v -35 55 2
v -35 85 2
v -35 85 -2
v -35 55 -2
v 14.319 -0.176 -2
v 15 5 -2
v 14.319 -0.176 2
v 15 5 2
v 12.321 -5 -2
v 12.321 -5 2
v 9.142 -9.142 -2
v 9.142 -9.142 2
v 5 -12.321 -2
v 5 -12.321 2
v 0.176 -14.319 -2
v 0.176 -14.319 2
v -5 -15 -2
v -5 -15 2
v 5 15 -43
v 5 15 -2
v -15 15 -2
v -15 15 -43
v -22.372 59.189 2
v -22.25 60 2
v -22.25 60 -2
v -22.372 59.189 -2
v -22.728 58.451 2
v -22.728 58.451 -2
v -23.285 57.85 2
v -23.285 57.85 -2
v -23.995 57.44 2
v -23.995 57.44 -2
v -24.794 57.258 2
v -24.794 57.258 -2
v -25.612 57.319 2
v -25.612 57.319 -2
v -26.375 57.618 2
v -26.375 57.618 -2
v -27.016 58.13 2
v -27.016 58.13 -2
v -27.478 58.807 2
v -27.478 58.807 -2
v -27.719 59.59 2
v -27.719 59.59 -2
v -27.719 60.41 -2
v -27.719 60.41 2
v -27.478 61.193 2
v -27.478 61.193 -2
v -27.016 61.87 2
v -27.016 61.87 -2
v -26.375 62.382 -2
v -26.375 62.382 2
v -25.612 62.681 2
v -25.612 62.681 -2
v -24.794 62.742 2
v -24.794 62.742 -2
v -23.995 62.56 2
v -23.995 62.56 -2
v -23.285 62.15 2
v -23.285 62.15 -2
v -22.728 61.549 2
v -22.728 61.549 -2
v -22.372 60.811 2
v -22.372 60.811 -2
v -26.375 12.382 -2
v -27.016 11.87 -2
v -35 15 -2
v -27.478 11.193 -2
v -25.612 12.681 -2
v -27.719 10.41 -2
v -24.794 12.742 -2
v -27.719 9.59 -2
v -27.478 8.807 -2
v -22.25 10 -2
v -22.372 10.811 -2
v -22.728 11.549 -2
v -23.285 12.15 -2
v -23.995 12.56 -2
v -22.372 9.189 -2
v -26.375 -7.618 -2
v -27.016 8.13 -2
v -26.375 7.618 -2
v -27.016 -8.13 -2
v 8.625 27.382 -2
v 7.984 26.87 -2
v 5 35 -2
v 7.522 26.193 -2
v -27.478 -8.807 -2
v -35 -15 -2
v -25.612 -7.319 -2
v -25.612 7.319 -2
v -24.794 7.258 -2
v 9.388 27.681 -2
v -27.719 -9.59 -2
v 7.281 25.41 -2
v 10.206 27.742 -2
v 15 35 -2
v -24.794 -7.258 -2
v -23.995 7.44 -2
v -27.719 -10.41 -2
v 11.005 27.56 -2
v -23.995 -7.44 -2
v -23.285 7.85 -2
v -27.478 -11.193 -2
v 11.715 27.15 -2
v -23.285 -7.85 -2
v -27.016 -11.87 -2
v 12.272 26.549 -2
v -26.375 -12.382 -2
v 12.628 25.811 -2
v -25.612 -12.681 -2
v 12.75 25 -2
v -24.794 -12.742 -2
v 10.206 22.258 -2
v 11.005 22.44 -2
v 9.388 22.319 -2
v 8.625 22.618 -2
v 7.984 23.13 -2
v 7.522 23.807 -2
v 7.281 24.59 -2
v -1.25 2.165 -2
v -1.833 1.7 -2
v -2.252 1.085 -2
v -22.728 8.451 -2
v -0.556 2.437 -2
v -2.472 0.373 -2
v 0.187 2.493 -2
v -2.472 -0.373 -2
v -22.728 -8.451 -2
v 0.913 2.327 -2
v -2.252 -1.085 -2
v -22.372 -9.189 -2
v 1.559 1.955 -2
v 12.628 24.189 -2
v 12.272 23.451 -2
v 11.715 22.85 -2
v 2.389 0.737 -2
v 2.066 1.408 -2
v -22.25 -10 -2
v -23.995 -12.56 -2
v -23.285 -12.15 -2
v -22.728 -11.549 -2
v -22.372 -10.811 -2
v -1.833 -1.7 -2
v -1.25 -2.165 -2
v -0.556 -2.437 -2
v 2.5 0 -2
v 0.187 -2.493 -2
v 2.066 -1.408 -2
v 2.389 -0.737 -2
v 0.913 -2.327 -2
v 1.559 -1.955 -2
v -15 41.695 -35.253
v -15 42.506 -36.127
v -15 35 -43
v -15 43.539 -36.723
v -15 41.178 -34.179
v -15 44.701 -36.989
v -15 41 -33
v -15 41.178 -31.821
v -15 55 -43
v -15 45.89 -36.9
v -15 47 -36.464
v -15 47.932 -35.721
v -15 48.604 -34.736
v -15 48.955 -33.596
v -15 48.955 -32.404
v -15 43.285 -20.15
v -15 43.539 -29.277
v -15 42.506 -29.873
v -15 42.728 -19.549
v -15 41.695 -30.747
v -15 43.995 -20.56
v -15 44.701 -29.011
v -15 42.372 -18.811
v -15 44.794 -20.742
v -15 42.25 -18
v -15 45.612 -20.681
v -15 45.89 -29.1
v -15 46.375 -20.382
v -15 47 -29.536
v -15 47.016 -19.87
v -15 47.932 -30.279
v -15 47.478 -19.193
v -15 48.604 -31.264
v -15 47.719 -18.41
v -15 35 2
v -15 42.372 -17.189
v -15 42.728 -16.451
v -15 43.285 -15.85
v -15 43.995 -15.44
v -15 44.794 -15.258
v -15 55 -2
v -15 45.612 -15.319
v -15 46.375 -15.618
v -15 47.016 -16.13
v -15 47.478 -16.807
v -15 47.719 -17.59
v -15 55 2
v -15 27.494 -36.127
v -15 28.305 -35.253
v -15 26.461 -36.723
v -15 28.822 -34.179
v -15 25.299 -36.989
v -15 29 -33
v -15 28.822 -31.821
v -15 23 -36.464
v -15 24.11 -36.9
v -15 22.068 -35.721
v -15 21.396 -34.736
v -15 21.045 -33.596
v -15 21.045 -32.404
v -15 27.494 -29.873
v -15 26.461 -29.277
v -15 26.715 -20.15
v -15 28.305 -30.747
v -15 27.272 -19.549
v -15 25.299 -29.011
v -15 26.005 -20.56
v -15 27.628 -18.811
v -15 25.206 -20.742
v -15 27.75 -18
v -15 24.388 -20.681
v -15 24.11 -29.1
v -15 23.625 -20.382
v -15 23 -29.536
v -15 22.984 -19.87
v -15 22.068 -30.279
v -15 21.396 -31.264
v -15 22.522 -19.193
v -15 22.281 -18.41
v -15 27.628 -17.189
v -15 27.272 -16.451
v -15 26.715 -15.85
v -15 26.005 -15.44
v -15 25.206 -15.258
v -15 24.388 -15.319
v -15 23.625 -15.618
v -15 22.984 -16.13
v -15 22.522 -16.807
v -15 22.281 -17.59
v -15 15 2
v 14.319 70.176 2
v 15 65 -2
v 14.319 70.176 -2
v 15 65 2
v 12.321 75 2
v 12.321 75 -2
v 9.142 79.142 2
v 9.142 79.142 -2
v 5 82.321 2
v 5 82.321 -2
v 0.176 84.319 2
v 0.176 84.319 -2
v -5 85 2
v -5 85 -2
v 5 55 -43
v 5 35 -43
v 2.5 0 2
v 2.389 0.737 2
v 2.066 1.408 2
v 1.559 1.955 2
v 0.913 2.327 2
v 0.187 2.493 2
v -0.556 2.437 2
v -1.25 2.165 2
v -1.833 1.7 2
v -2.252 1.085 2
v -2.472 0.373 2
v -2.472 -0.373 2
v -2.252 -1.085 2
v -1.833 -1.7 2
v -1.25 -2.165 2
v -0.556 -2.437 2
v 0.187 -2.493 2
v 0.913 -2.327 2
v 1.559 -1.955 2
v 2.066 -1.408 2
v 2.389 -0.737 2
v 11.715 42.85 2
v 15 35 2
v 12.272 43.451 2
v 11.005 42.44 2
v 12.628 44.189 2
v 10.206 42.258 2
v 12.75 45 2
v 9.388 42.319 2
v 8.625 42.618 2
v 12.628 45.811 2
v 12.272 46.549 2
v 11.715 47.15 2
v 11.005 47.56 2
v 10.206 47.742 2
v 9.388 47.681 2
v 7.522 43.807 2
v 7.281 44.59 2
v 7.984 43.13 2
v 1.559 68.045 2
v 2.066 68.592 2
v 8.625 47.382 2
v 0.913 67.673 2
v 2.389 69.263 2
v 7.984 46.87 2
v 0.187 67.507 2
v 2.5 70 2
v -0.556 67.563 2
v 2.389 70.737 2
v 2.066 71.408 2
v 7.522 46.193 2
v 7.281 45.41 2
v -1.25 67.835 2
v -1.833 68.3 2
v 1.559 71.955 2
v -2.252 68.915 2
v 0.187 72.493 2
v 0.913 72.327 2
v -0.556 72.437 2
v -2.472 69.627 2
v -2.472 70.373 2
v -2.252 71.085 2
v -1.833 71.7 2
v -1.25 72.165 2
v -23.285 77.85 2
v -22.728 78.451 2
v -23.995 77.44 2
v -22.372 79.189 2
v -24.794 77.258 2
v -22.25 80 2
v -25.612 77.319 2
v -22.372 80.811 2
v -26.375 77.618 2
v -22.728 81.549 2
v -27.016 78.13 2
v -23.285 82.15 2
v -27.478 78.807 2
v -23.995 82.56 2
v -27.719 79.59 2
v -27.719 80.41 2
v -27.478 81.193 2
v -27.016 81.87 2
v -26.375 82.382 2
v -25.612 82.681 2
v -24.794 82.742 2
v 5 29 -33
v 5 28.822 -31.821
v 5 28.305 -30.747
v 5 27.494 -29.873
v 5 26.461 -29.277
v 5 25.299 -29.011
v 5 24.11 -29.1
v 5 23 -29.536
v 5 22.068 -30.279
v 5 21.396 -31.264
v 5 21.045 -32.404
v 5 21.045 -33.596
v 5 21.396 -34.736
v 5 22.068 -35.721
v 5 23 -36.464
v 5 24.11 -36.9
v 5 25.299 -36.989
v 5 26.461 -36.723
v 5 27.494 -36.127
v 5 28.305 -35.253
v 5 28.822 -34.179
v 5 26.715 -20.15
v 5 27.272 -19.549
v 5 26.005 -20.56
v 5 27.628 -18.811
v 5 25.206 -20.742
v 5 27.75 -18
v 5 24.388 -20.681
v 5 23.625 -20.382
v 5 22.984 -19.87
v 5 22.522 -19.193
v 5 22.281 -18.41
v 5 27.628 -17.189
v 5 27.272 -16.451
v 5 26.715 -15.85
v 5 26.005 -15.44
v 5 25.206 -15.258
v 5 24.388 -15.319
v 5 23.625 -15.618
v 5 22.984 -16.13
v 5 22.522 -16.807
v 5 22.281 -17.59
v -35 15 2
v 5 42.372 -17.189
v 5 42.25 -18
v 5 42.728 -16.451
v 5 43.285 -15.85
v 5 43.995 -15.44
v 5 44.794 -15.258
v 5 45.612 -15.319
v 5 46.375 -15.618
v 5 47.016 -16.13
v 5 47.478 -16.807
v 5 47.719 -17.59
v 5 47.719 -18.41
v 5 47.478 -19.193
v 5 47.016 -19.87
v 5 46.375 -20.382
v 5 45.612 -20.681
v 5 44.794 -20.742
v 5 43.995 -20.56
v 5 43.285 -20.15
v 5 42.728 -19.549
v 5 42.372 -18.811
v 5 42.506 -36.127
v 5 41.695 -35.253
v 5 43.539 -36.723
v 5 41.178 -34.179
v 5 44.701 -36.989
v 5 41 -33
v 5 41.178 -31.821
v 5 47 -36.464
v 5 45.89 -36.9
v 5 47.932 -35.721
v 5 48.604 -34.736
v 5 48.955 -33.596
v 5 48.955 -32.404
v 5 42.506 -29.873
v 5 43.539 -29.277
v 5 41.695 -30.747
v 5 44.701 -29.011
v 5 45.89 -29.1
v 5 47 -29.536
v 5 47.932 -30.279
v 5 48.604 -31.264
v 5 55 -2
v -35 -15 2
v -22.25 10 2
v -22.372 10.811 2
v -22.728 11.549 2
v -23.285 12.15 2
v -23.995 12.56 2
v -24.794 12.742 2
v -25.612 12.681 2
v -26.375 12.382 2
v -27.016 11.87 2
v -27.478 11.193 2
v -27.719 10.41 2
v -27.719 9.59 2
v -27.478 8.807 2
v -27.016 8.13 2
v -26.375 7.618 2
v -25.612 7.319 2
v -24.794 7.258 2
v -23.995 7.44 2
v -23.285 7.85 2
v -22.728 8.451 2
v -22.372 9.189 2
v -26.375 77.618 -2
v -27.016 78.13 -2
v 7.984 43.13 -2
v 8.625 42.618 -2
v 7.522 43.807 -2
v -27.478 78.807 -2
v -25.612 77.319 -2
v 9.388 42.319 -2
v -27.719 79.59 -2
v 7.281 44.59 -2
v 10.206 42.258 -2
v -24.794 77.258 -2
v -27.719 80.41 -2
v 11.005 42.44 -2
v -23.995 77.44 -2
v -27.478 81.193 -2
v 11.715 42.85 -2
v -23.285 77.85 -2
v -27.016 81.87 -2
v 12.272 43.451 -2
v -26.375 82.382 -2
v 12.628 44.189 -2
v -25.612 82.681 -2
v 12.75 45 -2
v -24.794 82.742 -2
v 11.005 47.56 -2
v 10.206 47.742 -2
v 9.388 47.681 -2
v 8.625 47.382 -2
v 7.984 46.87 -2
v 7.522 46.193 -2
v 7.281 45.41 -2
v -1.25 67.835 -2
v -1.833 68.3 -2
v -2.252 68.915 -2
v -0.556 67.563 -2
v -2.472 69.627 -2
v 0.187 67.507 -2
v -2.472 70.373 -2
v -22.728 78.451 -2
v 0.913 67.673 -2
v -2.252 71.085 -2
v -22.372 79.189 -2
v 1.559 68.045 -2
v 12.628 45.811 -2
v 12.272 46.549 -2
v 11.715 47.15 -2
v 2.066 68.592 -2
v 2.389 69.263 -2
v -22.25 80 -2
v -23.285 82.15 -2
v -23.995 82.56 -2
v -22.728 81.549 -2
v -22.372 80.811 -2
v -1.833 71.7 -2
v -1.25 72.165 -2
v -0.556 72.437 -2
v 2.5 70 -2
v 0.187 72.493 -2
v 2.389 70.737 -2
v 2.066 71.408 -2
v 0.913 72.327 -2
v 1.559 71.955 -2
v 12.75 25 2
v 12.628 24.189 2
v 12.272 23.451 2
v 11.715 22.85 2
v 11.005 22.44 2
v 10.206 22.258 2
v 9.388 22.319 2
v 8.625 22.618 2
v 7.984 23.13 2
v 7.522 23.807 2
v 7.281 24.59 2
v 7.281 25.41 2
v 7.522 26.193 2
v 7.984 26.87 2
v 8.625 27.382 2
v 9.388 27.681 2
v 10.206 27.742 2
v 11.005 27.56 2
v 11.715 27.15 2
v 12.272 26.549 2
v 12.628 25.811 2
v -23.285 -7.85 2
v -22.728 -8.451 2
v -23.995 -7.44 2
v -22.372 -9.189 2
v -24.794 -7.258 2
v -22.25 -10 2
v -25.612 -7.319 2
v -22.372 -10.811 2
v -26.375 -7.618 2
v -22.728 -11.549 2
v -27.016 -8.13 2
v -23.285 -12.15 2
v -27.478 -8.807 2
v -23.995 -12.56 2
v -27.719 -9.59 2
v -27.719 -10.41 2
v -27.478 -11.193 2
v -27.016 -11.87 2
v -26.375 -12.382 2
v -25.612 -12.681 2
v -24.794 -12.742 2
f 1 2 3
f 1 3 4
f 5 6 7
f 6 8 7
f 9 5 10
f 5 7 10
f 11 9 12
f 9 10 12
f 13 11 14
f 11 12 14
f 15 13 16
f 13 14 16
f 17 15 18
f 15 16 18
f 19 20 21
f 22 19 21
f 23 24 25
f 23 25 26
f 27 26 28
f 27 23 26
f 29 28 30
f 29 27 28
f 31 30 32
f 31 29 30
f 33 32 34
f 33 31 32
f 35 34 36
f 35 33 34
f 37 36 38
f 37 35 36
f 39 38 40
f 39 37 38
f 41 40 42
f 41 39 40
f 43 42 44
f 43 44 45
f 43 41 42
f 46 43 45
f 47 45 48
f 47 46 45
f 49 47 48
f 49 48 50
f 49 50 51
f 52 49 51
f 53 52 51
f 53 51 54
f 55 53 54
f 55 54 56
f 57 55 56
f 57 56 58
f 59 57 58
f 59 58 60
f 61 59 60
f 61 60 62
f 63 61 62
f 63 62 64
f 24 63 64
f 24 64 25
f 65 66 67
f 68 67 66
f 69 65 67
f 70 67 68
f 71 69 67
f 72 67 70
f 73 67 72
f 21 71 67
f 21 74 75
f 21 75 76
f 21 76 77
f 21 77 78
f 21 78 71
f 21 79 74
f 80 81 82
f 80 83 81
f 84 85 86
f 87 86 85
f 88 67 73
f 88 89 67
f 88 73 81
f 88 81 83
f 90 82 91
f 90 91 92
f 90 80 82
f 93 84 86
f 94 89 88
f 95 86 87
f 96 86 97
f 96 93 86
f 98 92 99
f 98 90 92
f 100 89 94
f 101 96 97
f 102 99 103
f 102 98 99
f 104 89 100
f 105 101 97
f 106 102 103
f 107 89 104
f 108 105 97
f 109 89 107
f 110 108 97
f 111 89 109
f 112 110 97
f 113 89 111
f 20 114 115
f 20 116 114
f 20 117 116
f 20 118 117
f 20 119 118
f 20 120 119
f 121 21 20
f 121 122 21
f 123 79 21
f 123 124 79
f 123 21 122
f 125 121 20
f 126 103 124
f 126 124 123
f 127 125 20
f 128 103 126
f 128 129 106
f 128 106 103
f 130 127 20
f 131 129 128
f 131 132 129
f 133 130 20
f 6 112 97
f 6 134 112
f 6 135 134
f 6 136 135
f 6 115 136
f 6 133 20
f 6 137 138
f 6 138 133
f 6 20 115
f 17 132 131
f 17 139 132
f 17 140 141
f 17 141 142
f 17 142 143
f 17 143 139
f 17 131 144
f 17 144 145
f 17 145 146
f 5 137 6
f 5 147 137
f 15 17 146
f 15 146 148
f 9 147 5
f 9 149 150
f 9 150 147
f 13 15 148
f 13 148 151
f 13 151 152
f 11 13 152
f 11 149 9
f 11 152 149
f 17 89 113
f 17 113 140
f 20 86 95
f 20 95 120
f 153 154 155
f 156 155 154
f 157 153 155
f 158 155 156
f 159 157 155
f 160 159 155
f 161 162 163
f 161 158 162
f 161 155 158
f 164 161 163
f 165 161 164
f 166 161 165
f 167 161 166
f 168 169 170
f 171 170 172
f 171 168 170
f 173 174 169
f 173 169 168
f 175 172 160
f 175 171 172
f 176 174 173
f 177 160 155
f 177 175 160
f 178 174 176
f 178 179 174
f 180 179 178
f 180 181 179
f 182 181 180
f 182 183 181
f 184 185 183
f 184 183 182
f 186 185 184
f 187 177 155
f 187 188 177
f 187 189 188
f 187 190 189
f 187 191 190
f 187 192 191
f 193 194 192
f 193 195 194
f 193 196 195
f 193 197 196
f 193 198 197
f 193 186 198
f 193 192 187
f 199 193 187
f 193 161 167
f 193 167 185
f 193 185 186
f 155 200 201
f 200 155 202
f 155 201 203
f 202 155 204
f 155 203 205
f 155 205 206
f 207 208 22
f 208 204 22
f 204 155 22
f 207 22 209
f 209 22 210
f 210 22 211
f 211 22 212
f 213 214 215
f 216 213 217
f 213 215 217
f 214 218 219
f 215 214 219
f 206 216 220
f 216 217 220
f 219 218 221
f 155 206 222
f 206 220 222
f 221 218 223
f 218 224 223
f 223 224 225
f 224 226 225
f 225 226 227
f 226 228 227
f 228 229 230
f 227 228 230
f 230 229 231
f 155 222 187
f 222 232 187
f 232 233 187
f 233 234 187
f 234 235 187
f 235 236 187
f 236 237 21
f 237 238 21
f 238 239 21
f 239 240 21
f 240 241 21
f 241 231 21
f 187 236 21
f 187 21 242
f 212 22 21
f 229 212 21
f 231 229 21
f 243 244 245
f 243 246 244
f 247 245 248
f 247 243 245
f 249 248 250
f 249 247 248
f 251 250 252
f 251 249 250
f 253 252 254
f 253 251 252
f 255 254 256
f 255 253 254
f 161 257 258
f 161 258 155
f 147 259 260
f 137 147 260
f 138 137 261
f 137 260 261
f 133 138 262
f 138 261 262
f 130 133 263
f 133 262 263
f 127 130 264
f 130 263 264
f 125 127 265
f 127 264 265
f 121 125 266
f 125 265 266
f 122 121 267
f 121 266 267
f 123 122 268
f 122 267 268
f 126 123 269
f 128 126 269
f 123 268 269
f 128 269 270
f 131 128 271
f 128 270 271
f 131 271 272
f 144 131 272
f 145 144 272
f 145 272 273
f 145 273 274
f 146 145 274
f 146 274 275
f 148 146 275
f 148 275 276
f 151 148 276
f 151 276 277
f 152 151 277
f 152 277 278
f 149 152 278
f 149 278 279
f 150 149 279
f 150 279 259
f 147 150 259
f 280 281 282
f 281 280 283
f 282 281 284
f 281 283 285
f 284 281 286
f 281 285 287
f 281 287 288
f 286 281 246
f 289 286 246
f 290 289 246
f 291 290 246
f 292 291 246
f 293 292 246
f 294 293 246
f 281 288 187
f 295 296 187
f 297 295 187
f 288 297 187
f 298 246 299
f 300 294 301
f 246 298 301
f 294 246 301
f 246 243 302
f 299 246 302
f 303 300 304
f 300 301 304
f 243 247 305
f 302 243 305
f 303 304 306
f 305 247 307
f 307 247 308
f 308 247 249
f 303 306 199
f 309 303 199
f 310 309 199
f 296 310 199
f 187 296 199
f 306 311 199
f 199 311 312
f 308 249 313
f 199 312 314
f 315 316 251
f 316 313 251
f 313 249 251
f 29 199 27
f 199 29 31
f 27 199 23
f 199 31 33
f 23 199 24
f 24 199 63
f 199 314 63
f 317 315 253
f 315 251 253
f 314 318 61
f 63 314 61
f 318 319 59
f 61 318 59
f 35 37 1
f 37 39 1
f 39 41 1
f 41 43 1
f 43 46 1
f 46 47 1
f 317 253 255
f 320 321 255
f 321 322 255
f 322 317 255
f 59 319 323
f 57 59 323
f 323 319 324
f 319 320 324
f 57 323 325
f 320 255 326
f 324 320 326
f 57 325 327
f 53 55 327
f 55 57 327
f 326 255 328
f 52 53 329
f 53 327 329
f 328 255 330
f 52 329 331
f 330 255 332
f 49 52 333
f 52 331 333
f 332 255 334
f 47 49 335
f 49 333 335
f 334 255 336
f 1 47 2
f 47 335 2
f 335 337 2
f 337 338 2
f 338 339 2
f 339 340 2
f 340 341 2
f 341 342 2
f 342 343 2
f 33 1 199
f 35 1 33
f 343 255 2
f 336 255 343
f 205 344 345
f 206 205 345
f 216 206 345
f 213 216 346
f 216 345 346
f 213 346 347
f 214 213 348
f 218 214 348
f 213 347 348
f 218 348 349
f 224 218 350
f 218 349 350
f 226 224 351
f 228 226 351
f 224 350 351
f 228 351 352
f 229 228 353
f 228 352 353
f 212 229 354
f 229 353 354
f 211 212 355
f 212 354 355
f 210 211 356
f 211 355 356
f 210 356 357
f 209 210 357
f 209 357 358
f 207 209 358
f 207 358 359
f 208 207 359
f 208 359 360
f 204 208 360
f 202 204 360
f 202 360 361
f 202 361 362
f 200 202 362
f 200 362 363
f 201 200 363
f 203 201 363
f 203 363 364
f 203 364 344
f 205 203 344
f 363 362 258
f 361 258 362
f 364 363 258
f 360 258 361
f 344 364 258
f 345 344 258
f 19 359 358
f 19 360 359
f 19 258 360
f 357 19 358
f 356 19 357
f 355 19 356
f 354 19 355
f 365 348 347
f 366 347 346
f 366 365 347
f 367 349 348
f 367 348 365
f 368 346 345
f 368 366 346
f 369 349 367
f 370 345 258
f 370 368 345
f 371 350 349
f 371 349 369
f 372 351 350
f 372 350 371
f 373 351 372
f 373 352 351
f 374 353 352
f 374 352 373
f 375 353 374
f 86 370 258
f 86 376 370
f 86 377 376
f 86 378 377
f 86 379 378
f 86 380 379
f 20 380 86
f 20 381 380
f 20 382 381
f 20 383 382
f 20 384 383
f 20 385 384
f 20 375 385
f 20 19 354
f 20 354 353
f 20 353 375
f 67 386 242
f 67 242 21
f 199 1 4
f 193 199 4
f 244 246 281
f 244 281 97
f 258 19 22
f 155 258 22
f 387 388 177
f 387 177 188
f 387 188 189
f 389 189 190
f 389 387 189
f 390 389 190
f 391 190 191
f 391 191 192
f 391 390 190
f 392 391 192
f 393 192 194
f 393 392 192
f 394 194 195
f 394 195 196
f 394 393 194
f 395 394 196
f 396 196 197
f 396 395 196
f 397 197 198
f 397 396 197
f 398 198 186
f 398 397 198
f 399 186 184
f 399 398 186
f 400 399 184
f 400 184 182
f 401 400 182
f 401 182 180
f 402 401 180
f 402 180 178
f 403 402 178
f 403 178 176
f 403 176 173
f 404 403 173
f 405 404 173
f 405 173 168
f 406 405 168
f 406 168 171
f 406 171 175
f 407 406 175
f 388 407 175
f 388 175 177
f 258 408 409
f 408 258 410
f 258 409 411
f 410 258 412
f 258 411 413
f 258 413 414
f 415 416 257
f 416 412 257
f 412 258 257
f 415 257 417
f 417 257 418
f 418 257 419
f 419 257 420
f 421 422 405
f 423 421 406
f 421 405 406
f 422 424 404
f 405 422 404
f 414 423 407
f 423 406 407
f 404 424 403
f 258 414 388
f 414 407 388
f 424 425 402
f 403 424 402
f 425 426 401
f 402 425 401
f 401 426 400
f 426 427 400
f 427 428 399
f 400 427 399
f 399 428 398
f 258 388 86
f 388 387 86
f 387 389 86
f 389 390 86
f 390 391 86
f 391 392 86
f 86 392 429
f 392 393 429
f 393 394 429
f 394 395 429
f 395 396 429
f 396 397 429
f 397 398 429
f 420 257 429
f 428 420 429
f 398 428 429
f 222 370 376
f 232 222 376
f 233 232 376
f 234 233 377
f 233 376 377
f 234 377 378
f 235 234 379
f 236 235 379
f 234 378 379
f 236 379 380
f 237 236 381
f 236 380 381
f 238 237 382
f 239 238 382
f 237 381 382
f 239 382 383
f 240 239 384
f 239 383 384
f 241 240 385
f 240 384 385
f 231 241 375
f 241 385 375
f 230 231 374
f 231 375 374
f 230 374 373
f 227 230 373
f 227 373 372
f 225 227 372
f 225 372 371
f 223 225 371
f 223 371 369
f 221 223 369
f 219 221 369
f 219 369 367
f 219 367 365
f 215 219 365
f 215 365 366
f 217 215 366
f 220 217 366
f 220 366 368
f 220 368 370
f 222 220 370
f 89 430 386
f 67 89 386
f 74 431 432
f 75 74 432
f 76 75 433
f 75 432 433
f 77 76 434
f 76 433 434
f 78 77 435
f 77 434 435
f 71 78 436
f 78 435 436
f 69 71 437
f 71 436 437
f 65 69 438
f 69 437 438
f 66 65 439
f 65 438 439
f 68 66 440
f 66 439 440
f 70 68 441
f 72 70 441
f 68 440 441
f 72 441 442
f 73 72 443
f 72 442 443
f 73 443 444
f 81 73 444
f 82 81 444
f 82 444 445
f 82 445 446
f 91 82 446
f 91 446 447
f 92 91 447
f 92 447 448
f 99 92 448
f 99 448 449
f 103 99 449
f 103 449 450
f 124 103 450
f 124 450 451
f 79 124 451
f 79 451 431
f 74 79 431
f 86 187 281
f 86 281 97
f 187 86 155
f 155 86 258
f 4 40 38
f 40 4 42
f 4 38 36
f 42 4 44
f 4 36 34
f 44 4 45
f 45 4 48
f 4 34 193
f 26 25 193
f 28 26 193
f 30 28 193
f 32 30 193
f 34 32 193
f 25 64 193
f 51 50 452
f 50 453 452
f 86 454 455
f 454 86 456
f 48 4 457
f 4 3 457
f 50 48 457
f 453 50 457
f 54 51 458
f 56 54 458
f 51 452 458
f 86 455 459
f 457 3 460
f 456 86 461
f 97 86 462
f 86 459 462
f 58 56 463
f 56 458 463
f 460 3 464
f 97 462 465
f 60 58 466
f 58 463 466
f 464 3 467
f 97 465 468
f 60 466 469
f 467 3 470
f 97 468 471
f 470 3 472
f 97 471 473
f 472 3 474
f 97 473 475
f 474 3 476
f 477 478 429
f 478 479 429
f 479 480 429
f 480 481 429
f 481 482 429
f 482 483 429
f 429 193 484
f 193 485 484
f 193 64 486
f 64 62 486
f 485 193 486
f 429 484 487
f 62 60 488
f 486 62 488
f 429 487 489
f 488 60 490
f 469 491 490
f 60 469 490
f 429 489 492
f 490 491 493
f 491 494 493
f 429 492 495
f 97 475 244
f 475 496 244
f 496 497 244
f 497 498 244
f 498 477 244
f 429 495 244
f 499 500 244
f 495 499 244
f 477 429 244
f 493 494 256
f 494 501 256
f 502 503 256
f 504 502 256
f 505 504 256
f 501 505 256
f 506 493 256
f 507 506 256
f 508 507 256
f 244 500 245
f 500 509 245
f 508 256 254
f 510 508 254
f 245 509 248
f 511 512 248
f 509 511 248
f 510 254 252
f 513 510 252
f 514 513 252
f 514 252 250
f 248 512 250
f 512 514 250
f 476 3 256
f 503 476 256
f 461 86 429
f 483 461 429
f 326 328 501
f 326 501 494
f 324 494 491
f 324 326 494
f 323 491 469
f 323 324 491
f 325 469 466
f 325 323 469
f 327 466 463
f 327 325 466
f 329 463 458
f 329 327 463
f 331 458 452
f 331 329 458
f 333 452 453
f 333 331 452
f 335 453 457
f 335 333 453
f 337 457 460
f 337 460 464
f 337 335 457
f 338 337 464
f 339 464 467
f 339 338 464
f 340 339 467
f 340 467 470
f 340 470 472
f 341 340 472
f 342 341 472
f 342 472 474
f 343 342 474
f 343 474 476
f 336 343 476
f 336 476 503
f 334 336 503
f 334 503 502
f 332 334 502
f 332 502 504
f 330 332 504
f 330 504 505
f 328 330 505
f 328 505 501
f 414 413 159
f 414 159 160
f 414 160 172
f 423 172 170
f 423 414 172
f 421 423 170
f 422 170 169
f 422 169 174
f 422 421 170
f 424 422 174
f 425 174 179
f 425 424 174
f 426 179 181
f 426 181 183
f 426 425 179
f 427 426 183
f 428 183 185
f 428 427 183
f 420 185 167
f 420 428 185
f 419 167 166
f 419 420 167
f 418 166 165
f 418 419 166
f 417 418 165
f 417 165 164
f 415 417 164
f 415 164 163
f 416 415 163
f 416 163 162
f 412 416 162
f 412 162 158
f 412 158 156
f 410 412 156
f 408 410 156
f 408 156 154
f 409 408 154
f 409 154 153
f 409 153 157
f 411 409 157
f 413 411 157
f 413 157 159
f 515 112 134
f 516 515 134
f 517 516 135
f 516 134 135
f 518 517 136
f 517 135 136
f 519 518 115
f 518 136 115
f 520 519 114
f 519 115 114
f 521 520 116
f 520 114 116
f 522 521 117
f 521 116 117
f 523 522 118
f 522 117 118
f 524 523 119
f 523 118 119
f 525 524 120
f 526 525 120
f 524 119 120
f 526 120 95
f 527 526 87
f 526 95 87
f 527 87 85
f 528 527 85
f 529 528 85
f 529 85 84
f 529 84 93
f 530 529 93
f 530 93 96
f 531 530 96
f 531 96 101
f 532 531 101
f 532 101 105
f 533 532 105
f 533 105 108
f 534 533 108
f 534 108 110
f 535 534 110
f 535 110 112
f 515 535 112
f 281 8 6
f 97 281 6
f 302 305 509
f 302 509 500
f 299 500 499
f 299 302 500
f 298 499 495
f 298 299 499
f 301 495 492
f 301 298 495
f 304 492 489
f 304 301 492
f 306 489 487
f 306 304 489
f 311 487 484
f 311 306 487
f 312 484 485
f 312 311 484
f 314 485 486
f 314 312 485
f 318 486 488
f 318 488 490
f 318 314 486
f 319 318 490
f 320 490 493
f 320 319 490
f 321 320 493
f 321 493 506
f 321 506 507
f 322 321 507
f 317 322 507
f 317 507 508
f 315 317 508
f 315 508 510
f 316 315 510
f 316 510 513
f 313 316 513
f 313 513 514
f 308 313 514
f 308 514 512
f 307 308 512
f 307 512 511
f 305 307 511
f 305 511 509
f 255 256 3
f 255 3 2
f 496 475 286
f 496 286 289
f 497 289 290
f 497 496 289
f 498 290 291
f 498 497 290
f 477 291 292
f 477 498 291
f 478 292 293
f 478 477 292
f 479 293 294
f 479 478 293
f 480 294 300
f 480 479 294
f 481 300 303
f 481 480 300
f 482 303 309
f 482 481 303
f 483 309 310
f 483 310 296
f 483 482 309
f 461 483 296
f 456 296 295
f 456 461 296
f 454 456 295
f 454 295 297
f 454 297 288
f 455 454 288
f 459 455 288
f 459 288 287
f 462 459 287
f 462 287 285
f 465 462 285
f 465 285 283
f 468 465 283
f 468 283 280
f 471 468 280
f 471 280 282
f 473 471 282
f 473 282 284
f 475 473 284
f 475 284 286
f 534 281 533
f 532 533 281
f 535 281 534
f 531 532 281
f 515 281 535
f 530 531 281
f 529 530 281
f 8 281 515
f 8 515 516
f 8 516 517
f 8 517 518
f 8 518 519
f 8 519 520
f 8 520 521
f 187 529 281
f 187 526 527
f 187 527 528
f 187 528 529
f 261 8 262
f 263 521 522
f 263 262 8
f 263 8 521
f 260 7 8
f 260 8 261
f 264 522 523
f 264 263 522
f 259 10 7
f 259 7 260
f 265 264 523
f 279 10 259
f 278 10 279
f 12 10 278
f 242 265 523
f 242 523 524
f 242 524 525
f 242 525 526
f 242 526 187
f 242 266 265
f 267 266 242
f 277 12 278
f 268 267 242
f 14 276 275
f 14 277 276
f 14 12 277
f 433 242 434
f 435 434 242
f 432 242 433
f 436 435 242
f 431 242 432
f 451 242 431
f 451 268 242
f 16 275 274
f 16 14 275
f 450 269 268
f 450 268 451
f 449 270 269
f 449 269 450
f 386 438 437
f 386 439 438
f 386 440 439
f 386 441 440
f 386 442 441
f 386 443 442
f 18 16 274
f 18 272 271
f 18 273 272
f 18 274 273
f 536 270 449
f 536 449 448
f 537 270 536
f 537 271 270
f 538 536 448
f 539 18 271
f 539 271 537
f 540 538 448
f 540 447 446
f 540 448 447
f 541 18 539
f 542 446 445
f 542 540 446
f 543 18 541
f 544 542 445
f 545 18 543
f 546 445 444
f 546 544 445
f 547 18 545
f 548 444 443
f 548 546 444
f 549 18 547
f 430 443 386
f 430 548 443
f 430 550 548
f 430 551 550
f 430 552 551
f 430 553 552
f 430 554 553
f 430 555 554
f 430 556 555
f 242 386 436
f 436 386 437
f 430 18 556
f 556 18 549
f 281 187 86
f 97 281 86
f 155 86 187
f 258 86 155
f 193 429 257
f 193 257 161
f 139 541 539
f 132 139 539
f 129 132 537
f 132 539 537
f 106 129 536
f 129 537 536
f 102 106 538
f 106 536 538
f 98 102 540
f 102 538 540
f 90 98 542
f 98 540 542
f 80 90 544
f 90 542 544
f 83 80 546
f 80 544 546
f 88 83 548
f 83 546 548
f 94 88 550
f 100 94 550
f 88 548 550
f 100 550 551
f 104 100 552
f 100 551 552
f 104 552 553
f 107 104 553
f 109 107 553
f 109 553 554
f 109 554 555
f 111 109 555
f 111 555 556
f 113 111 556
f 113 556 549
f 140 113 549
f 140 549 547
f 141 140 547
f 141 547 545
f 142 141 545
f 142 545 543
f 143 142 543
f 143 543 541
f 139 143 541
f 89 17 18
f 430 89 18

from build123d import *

# Parameters (mm, degrees)
F0_W      = 30
F0_H      = 30
F1_DEPTH  = 2
F2_DEPTH  = 20
F3_R      = 2.75
F4_DEPTH  = 4.001
F5_W      = 20
F5_H      = 45
F6_DEPTH  = 20
F7_DEPTH  = 20
F8_R      = 4
F8_R_2    = 2.75
F9_DEPTH  = 40.001
F10_R     = 2.75
F11_DEPTH = 4.001
F12_R     = 2.5
F13_DEPTH = 45.001
F14_R     = 20


with BuildPart() as f1:
    # F0 (on Top) → F1 (new body, symmetric)
    with BuildSketch(Plane.XY):
        Rectangle(F0_W, F0_H)
    extrude(amount=F1_DEPTH, both=True)

    # F2 (add): a face of the model
    f2_faces = [f1.faces().sort_by_distance(p)[0] for p in [
        (-15, 0, 0),
    ]]
    extrude(f2_faces, amount=F2_DEPTH)

    # F3 (on face) → F4 (cut, through all)
    with BuildSketch(Plane.XY.offset(2)):
        with Locations((-25, 10)):
            Circle(F3_R)
        with Locations((-25, -10)):
            Circle(F3_R)
    extrude(amount=-F4_DEPTH, mode=Mode.SUBTRACT)

    # F5 (on face) → F6 (join)
    with BuildSketch(Plane(origin=(0, 15, 0), x_dir=(-1, 0, 0), z_dir=(0, 1, 0))):
        with Locations((5, -20.5)):
            Rectangle(F5_W, F5_H)
    extrude(amount=F6_DEPTH)

    # F7 (add, through all): a face of the model
    f7_faces = [f1.faces().sort_by_distance(p)[0] for p in [
        (10, 15, 0),
    ]]
    extrude(f7_faces, amount=F7_DEPTH)

    # F8 (on face) → F9 (cut, through all)
    with BuildSketch(Plane.YZ.offset(5)):
        with Locations((25, -33)):
            Circle(F8_R)
        with Locations((25, -18)):
            Circle(F8_R_2)
    extrude(amount=-F9_DEPTH, mode=Mode.SUBTRACT)

    # F10 (on face) → F11 (cut, through all)
    with BuildSketch(Plane(origin=(0, 0, -2), x_dir=(1, 0, 0), z_dir=(0, 0, -1))):
        with Locations((10, -25)):
            Circle(F10_R)
    extrude(amount=-F11_DEPTH, mode=Mode.SUBTRACT)

    # F12 (on face) → F13 (cut, through all)
    with BuildSketch(Plane.XY.offset(2)):
        Circle(F12_R)
    extrude(amount=-F13_DEPTH, mode=Mode.SUBTRACT)

    # F14
    f14_edges = [f1.edges().sort_by_distance(p)[0] for p in [
        (15, -15, 0),
    ]]
    fillet(f14_edges, radius=F14_R)


with BuildPart() as f15_1:
    # F15: instance of F1
    add(f1.part.mirror(Plane(origin=(-4.3617021277, 35, -19.6276595745), x_dir=(-1, 0, 0), z_dir=(0, 1, 0))))


solid = Compound([f1.part, f15_1.part])
